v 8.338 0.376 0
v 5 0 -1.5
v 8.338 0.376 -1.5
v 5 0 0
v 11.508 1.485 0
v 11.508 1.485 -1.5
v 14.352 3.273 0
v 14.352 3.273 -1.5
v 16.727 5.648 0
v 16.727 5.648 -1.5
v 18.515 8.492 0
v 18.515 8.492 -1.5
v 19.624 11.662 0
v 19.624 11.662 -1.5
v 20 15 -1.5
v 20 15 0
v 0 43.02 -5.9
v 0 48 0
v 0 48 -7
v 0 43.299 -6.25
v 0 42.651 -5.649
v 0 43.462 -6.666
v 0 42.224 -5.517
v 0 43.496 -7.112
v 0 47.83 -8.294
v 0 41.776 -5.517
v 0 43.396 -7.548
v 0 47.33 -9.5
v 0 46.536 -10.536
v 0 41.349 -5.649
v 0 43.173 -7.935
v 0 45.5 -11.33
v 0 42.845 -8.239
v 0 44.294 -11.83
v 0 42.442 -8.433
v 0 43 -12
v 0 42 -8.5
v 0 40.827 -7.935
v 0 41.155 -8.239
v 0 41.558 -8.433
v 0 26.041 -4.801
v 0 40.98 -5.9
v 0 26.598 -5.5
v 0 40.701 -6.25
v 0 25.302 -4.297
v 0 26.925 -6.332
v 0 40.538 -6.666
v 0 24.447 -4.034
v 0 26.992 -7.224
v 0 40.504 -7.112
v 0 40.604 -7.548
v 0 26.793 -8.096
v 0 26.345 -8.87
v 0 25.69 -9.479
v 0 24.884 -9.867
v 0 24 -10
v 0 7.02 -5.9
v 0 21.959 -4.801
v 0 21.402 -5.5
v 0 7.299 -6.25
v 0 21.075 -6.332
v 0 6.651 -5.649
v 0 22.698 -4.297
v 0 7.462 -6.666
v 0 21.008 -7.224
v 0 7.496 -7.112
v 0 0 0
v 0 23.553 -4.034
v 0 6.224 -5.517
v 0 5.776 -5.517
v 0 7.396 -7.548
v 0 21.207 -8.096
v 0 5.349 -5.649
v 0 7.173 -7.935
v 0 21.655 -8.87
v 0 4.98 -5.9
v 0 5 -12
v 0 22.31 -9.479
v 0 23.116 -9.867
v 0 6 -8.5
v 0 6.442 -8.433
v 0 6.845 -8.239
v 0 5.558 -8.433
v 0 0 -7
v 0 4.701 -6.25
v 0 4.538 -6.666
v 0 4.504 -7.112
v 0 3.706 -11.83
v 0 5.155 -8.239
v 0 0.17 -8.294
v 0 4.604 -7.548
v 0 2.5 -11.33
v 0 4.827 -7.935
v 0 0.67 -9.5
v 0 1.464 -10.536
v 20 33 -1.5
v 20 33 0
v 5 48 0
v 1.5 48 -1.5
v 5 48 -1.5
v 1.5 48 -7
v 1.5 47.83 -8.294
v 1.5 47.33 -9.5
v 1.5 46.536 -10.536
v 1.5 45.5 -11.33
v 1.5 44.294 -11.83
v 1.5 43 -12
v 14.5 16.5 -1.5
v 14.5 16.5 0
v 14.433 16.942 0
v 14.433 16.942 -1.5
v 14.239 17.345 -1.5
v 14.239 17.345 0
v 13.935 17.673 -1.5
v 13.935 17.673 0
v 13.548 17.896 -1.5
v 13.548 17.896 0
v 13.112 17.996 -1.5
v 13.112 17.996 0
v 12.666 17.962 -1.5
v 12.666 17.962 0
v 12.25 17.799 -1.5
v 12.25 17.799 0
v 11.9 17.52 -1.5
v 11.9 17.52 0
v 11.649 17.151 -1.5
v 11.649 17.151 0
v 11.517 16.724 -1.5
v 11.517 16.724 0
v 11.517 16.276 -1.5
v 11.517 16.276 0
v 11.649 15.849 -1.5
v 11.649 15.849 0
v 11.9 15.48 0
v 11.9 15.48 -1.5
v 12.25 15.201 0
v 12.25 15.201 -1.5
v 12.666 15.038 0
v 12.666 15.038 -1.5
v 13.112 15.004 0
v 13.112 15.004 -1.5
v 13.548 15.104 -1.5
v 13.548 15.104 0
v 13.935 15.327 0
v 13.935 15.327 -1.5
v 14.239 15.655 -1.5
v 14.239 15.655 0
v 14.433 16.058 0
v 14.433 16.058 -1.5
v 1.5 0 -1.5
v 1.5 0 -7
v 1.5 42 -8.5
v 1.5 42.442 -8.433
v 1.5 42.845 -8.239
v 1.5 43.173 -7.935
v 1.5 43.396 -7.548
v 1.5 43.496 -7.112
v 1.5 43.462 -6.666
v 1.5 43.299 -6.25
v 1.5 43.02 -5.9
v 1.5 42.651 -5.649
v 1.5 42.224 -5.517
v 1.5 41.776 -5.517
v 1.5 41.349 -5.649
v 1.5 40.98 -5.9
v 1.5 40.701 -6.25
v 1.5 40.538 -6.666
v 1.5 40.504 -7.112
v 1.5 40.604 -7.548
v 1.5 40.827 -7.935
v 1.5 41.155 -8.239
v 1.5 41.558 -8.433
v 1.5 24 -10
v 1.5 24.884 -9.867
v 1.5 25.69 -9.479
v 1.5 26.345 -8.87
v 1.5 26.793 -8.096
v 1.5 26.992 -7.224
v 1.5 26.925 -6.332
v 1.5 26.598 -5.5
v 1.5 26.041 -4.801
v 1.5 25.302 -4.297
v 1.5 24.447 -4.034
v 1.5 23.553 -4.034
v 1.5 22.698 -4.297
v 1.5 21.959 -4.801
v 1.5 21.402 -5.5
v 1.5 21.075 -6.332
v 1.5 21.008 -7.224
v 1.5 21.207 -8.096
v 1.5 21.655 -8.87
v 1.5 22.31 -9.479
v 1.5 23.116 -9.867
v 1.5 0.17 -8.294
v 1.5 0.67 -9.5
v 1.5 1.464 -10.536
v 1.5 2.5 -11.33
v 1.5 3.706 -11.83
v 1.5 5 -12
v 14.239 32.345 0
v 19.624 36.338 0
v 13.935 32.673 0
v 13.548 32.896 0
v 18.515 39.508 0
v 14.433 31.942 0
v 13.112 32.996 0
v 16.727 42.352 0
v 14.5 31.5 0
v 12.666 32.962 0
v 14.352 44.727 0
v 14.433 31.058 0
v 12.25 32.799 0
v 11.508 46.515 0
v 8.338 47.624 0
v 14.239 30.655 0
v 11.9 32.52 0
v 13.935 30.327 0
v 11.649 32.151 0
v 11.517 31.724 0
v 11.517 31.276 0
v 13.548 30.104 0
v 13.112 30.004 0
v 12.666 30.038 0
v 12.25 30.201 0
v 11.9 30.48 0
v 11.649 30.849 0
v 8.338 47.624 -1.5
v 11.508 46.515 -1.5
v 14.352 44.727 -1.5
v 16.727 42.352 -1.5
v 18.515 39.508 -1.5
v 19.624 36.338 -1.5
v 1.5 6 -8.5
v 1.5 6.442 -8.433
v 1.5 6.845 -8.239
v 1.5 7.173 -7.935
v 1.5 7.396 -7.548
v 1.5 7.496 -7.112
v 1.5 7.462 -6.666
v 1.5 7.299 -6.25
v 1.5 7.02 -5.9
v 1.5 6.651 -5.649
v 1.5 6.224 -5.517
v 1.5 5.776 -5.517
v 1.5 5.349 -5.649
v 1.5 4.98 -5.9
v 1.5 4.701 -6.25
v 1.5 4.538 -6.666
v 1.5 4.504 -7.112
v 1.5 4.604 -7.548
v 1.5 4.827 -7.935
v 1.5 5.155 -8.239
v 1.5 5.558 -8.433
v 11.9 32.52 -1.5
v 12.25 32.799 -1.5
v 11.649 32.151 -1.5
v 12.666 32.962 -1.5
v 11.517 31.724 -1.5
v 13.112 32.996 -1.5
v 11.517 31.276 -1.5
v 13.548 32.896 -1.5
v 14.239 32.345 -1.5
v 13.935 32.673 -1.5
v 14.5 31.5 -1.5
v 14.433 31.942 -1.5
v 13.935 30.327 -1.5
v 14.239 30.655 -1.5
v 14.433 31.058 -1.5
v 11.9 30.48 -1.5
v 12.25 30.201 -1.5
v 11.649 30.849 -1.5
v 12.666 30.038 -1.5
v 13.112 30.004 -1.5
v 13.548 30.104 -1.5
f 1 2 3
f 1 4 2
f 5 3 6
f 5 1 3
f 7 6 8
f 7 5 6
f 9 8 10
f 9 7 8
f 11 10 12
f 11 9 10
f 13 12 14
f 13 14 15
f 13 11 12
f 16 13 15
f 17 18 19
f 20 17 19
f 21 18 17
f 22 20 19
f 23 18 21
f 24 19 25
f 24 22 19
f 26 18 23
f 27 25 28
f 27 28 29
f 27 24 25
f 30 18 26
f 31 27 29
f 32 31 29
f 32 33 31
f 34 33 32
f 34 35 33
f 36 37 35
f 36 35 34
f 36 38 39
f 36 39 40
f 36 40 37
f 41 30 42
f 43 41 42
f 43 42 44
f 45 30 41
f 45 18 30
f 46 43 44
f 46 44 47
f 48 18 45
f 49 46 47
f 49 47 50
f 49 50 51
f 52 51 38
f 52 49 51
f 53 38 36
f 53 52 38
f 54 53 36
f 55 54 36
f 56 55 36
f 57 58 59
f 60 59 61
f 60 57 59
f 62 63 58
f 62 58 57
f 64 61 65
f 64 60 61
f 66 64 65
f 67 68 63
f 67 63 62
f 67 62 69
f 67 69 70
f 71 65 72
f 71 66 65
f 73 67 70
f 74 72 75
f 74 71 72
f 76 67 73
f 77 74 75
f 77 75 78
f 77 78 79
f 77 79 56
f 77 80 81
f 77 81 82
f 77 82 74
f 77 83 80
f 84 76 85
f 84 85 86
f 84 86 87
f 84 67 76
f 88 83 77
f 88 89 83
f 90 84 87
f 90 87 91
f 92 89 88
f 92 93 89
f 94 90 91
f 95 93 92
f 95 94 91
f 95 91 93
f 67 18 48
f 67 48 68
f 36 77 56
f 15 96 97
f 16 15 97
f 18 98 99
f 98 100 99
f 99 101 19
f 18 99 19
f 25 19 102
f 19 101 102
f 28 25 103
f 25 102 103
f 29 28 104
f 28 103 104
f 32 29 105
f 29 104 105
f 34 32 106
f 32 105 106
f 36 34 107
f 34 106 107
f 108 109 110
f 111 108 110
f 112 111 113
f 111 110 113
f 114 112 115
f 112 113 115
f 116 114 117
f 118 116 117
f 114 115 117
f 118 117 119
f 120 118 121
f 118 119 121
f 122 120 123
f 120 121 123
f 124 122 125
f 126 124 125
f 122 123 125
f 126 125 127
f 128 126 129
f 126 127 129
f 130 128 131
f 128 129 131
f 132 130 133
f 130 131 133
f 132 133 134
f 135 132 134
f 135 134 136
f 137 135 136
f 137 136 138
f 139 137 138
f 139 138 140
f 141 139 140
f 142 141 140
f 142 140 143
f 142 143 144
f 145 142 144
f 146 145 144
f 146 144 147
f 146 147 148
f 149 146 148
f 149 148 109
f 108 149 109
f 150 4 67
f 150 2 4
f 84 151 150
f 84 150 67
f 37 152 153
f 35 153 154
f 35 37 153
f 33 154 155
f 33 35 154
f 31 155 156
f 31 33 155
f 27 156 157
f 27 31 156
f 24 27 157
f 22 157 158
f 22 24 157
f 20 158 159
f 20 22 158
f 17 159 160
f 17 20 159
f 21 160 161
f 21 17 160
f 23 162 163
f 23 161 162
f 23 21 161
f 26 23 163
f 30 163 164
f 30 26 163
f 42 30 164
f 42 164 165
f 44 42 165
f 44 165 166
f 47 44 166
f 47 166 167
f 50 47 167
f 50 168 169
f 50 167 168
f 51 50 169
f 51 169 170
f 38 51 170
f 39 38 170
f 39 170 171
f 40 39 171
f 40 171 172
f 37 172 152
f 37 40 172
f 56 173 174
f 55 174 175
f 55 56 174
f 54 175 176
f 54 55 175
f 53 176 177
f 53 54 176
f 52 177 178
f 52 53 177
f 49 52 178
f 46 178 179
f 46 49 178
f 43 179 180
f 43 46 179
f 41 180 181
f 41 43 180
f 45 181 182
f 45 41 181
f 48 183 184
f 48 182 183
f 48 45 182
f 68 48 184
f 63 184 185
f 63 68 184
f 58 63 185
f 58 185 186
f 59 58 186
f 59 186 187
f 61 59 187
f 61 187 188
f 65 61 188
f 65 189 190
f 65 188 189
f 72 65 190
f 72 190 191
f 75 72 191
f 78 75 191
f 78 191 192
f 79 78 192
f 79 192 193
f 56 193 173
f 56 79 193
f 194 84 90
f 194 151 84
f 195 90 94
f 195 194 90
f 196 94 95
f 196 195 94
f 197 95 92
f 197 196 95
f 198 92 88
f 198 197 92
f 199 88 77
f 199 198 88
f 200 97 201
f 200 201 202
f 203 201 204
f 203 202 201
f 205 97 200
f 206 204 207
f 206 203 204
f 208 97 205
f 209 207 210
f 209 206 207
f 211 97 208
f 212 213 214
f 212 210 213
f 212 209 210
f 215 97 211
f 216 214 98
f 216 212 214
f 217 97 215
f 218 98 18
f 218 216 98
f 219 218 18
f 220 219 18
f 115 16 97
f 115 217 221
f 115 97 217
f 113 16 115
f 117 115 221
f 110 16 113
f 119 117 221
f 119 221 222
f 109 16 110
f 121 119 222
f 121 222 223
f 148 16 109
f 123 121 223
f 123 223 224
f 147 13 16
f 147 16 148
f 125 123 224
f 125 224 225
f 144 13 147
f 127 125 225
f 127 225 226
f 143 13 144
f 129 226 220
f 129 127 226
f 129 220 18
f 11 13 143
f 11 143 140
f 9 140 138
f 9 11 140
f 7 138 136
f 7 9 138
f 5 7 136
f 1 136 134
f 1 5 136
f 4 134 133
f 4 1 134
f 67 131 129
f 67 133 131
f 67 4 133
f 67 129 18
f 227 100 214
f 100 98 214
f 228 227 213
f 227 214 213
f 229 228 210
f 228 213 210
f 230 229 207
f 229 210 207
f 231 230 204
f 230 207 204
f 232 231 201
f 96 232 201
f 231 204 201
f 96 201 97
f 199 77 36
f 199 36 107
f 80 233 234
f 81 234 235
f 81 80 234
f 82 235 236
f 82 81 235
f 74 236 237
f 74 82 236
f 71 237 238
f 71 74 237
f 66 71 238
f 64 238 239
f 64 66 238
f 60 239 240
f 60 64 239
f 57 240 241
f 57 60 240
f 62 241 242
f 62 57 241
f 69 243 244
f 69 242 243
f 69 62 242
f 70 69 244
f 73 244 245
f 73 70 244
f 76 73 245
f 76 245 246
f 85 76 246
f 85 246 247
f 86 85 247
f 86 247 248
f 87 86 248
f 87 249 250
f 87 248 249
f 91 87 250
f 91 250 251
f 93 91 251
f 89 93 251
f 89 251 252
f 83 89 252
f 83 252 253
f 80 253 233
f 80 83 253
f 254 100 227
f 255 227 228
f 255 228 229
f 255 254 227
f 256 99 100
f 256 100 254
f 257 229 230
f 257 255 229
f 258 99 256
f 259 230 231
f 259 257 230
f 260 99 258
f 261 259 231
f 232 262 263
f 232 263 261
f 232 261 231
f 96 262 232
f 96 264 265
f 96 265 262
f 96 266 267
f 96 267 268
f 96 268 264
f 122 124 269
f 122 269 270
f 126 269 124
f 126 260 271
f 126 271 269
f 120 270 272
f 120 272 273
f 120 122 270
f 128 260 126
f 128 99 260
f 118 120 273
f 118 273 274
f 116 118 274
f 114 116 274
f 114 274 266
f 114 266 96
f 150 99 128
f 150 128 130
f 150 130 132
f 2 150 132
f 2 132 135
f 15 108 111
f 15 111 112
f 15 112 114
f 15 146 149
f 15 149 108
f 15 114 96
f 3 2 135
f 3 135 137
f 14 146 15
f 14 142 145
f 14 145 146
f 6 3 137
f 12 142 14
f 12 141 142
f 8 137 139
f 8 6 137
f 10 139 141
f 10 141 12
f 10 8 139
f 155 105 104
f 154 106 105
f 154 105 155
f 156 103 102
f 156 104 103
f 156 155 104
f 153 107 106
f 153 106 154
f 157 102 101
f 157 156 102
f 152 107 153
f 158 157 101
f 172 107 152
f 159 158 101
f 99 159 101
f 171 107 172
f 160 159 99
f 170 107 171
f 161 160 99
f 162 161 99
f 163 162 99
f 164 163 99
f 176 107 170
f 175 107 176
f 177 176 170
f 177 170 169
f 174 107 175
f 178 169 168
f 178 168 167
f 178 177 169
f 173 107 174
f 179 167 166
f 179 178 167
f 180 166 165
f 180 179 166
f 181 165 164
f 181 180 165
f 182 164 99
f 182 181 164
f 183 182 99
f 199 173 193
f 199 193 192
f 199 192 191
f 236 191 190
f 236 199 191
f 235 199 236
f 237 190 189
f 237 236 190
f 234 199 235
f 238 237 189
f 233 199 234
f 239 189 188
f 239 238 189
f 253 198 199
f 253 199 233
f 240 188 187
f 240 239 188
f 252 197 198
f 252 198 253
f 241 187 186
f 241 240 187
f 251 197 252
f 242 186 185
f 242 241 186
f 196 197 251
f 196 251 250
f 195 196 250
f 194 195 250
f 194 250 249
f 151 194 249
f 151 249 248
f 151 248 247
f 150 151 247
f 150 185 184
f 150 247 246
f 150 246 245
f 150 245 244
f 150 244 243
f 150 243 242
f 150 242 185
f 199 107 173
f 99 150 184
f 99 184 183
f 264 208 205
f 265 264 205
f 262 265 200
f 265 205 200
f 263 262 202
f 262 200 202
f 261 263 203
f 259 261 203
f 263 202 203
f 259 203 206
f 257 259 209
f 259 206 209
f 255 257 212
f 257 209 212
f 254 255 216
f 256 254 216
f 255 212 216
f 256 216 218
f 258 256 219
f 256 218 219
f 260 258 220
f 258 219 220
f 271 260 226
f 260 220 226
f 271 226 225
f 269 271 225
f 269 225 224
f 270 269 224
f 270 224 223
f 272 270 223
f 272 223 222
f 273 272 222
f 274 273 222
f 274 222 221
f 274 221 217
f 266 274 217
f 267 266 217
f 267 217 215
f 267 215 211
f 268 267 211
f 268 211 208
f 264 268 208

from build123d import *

# Parameters (mm, degrees)
BOSS_EXTRUDE1_DEPTH = 48
SKETCH2_R           = 1.5
CUT_EXTRUDE1_DEPTH  = 13
SKETCH3_R           = 1.5
SKETCH3_R_2         = 3
CUT_EXTRUDE3_DEPTH  = 21
FILLET1_R           = 5
FILLET2_R           = 15


with BuildPart() as part:
    # Sketch1 → Boss-Extrude1 (new body)
    with BuildSketch(Plane(origin=(0, 0, 0), x_dir=(1, 0, 0), z_dir=(0, 1, 0))):
        Polygon((0, 0), (0, 12), (1.5, 12), (1.5, 1.5), (20, 1.5), (20, 0), align=None)
    extrude(amount=BOSS_EXTRUDE1_DEPTH)

    # Sketch2 → Cut-Extrude1 (cut, through all)
    with BuildSketch(Plane.XY):
        with Locations((13, 31.5)):
            Circle(SKETCH2_R)
        with Locations((13, 16.5)):
            Circle(SKETCH2_R)
    extrude(amount=-CUT_EXTRUDE1_DEPTH, mode=Mode.SUBTRACT)

    # Sketch3 → Cut-Extrude3 (cut, through all)
    with BuildSketch(Plane(origin=(0, 0, 0), x_dir=(0, 0, -1), z_dir=(1, 0, 0))):
        with Locations((7, 42)):
            Circle(SKETCH3_R)
        with Locations((7, 24)):
            Circle(SKETCH3_R_2)
        with Locations((7, 6)):
            Circle(SKETCH3_R)
    extrude(amount=CUT_EXTRUDE3_DEPTH, mode=Mode.SUBTRACT)

    # Fillet1
    fillet1_edges = [part.edges().sort_by_distance(p)[0] for p in [
        (0.75, 48, -12),
        (0.75, 0, -12),
    ]]
    fillet(fillet1_edges, radius=FILLET1_R)

    # Fillet2
    fillet2_edges = [part.edges().sort_by_distance(p)[0] for p in [
        (20, 48, -0.75),
        (20, 0, -0.75),
    ]]
    fillet(fillet2_edges, radius=FILLET2_R)


solid = part.part
